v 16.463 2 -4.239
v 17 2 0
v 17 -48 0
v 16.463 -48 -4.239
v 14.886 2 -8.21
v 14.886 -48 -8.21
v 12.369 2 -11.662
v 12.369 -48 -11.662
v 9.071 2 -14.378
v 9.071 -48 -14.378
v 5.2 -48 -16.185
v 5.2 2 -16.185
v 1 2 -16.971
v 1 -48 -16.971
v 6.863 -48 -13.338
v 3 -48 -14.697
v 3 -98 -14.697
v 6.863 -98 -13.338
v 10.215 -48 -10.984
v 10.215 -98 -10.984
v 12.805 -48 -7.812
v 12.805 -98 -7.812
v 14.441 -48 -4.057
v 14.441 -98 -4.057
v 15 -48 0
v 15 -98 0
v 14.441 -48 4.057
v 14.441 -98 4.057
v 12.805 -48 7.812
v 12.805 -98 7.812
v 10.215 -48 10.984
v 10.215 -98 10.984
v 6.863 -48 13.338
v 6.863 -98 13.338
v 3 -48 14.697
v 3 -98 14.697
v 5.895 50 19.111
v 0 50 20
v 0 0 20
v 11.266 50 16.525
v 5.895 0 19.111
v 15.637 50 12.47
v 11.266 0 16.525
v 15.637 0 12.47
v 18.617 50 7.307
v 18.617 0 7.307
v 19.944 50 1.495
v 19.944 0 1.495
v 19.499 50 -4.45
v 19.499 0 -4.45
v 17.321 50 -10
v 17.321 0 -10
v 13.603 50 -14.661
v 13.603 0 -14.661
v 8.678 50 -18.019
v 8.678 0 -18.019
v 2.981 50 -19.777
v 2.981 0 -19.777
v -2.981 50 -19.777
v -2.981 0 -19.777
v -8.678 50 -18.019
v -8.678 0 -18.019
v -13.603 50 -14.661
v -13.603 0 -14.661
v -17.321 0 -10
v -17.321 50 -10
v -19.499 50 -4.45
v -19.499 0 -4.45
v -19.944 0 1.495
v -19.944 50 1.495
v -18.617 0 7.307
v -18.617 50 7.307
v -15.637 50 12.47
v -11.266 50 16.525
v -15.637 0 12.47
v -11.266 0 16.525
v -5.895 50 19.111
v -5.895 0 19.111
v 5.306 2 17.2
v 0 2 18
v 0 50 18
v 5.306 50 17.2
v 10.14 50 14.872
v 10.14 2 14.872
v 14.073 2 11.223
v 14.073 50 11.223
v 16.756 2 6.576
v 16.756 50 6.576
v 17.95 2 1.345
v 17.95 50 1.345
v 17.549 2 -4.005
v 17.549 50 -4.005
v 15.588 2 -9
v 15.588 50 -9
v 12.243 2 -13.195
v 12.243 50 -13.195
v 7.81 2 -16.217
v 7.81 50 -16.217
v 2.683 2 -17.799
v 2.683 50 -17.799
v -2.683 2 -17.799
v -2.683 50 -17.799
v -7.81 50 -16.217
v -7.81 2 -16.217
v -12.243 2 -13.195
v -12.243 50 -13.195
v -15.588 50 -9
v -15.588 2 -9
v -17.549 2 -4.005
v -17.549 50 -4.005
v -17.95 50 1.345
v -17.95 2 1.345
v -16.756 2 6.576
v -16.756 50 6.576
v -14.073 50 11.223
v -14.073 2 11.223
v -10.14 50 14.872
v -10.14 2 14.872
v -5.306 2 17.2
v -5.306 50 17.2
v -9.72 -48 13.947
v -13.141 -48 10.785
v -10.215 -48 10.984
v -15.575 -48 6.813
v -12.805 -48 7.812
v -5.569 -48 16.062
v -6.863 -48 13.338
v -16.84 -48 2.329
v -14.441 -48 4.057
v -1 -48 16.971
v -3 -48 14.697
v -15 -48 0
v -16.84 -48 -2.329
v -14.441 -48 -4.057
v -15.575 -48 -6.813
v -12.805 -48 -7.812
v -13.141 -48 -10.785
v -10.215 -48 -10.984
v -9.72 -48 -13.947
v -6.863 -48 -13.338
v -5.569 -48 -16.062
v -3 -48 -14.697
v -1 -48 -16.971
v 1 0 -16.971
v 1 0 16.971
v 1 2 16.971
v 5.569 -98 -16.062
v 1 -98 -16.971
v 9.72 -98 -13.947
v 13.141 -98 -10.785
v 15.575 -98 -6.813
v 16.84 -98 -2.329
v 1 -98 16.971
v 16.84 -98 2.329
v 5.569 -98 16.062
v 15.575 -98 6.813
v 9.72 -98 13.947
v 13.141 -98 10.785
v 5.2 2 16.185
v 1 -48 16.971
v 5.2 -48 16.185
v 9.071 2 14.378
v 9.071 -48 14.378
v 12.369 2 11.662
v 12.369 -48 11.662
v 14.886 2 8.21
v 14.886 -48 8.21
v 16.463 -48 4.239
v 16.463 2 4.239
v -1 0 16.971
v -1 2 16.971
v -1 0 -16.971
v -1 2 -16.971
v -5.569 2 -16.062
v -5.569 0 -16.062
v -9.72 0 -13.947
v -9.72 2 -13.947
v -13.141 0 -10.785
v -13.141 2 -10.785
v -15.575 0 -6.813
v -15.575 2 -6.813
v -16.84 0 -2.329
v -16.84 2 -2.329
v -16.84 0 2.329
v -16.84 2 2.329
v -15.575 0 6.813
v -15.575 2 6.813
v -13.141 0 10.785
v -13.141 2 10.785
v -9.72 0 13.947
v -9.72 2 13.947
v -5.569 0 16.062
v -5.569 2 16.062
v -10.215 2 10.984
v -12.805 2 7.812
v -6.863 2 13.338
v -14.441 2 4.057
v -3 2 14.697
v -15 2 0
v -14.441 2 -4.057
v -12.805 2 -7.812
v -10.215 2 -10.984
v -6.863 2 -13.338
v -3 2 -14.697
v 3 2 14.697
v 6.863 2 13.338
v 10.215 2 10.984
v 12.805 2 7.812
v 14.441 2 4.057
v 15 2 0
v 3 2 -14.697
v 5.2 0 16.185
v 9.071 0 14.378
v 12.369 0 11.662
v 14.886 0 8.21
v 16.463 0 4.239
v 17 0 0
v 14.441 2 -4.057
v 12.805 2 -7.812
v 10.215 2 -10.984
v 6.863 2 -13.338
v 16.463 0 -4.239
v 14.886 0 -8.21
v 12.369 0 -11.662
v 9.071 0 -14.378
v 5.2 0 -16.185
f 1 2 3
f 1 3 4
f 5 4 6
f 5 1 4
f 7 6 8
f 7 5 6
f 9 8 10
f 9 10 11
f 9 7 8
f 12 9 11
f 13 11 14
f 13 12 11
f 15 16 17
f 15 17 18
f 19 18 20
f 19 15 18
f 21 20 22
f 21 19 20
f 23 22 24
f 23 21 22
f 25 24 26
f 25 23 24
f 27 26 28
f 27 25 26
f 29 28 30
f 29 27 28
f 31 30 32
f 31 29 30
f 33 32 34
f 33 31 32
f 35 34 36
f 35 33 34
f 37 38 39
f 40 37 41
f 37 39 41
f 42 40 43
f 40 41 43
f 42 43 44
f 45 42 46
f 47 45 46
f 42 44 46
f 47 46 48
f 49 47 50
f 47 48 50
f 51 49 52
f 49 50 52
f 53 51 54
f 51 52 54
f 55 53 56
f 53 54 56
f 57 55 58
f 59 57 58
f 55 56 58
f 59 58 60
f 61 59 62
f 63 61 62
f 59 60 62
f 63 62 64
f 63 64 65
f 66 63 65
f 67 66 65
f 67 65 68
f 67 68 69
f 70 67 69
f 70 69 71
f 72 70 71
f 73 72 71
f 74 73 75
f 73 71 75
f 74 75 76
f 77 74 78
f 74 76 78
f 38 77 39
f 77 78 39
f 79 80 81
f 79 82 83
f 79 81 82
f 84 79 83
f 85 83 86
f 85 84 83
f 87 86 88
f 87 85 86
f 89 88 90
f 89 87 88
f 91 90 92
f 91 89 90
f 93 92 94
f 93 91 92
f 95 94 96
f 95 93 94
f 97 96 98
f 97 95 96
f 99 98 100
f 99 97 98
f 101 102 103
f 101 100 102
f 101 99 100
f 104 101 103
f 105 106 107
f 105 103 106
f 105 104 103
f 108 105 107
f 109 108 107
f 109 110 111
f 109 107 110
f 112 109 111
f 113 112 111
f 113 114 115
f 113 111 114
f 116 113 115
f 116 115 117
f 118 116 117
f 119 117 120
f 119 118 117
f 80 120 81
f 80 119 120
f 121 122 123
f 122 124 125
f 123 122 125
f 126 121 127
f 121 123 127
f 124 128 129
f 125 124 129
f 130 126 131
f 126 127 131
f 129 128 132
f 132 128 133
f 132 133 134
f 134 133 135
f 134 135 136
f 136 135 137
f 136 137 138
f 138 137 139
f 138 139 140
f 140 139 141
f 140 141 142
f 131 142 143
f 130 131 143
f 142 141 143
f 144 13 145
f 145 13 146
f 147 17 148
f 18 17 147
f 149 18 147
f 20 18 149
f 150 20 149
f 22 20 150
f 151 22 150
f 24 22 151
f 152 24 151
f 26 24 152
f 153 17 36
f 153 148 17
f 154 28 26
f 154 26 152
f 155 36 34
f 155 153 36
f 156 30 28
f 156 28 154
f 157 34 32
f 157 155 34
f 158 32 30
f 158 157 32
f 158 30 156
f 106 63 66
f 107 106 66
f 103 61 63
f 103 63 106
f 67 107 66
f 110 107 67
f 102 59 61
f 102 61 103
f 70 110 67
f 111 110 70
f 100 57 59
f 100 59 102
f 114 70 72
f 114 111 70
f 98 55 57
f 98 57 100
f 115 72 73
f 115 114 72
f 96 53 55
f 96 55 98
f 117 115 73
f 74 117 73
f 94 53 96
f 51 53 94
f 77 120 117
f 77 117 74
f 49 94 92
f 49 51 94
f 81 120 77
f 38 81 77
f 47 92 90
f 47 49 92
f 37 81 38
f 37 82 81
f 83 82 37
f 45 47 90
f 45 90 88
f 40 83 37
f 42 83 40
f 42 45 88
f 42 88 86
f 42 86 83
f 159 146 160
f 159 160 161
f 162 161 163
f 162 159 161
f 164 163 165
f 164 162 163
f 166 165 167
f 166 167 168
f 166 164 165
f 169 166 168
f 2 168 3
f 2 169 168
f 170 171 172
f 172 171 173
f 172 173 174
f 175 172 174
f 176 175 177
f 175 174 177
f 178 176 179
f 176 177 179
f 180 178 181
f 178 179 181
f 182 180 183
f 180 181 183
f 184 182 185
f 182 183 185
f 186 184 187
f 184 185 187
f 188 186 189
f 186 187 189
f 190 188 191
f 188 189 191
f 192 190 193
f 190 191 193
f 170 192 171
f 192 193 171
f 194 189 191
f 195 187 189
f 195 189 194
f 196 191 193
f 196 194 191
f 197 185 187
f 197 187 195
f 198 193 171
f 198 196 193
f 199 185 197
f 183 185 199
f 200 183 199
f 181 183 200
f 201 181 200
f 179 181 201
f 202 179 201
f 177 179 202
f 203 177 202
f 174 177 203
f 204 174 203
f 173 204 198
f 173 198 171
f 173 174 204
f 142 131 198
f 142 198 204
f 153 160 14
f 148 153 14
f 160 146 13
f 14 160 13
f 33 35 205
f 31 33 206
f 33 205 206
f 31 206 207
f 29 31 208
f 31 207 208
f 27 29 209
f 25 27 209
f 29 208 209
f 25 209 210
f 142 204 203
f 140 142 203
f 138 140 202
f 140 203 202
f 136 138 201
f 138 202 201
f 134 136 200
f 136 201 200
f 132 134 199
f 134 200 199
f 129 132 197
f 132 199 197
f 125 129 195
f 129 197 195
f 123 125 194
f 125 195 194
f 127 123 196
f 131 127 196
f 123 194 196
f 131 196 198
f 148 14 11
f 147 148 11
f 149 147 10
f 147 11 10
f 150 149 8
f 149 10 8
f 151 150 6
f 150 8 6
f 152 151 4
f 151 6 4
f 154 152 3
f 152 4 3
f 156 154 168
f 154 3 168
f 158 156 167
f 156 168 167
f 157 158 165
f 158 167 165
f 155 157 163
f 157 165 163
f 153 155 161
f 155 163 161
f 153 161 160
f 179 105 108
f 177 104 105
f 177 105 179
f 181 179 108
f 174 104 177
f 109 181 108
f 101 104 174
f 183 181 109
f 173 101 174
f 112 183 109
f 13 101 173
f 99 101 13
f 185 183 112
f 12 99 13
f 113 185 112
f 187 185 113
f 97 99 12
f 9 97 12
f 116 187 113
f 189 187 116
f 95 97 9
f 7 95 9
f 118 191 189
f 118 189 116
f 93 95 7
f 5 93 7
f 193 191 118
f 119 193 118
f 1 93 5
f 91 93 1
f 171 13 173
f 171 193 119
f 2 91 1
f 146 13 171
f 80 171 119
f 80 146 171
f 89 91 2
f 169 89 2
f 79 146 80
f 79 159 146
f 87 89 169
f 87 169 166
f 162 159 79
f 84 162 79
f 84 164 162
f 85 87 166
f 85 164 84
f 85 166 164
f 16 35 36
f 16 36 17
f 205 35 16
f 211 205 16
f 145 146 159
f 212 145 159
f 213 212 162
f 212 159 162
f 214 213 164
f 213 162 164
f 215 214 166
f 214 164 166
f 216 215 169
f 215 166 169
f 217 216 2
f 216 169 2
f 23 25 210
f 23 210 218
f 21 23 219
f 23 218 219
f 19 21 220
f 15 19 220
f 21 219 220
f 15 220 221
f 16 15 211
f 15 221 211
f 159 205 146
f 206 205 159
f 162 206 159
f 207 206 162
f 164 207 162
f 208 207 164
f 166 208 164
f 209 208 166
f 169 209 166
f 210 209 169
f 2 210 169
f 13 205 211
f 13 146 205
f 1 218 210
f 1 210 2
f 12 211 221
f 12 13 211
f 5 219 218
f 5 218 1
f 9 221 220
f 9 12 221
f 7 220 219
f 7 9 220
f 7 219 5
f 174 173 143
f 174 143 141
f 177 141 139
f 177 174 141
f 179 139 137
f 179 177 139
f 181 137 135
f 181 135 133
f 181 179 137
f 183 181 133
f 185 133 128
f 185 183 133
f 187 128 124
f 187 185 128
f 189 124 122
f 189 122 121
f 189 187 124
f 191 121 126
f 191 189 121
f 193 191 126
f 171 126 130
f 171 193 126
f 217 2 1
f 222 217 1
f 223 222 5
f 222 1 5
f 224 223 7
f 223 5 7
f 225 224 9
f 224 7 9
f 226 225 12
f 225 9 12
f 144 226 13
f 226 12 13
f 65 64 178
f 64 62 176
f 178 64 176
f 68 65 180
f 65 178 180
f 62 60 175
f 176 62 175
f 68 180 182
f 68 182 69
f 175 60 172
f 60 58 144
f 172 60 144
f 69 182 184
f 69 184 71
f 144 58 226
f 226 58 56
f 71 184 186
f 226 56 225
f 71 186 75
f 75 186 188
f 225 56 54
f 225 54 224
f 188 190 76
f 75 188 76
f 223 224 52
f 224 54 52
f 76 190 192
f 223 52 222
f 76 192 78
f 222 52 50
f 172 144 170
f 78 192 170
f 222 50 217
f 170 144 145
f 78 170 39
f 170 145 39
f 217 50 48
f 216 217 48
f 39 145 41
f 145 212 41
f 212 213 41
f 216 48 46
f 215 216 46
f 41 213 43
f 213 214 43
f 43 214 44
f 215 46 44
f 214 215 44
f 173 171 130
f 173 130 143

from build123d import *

# Parameters (mm, degrees)
SKETCH1_R              = 20
BOSS_EXTRUDE1_DEPTH    = 50
SHELL3_T               = -2
CUT_EXTRUDE1_DEPTH     = 50
BOSS_EXTRUDE3_DEPTH    = 50
BOSS_EXTRUDE3_2_DEPTH  = 50
SHELL6_T               = -2
SHELL7_T               = -2
PROCESSINGADJUST_DEPTH = 50


with BuildPart() as part:
    # Sketch1 → Boss-Extrude1 (new body)
    with BuildSketch(Plane(origin=(0, 0, 0), x_dir=(1, 0, 0), z_dir=(0, 1, 0))):
        with Locations(Location((0, 0, 0), (0, 0, 270))):
            Circle(SKETCH1_R)
    extrude(amount=BOSS_EXTRUDE1_DEPTH)

    # Shell3
    shell3_openings = [part.faces().sort_by_distance(p)[0] for p in [
        (0, 50, 0),
    ]]
    offset(amount=SHELL3_T, openings=shell3_openings, kind=Kind.INTERSECTION)

    # Sketch2 → Cut-Extrude1 (cut)
    with BuildSketch(Plane(origin=(0, 2, 0), x_dir=(1, 0, 0), z_dir=(0, 1, 0))):
        with BuildLine():
            ThreePointArc((17, 0), (12.369316877, 11.66190379), (1, 16.970562748))
            Line((1, 16.970562748), (1, -16.970562748))
            ThreePointArc((1, -16.970562748), (12.369316877, -11.66190379), (17, 0))
        make_face()
        with BuildLine():
            Line((-1, -16.970562748), (-1, 16.970562748))
            ThreePointArc((-1, 16.970562748), (-17, 0), (-1, -16.970562748))
        make_face()
    extrude(amount=-CUT_EXTRUDE1_DEPTH, mode=Mode.SUBTRACT)


with BuildPart() as body_2:
    # Sketch2 → Boss-Extrude3 (new body)
    with BuildSketch(Plane(origin=(0, 2, 0), x_dir=(1, 0, 0), z_dir=(0, 1, 0))):
        with BuildLine():
            ThreePointArc((17, 0), (12.369316877, 11.66190379), (1, 16.970562748))
            Line((1, 16.970562748), (1, -16.970562748))
            ThreePointArc((1, -16.970562748), (12.369316877, -11.66190379), (17, 0))
        make_face()
    extrude(amount=-BOSS_EXTRUDE3_DEPTH)

    # Shell6
    shell6_openings = [body_2.faces().sort_by_distance(p)[0] for p in [
        (7.758345486, -48, 0),
        (7.758345486, 2, 0),
    ]]
    offset(amount=SHELL6_T, openings=shell6_openings)

    # Sketch7 → processingadjust (add)
    with BuildSketch(Plane.XZ.offset(48)):
        with BuildLine():
            Line((1, 16.970562748), (1, -16.970562748))
            ThreePointArc((1, -16.970562748), (17, 0), (1, 16.970562748))
        make_face()
        with BuildLine():
            Line((3, 14.696938457), (3, -14.696938457))
            ThreePointArc((3, -14.696938457), (15, 0), (3, 14.696938457))
        make_face(mode=Mode.SUBTRACT)
    extrude(amount=PROCESSINGADJUST_DEPTH)


with BuildPart() as body_3:
    # Sketch2 → Boss-Extrude3 2 (new body)
    with BuildSketch(Plane(origin=(0, 2, 0), x_dir=(1, 0, 0), z_dir=(0, 1, 0))):
        with BuildLine():
            Line((-1, -16.970562748), (-1, 16.970562748))
            ThreePointArc((-1, 16.970562748), (-17, 0), (-1, -16.970562748))
        make_face()
    extrude(amount=-BOSS_EXTRUDE3_2_DEPTH)

    # Shell7
    shell7_openings = [body_3.faces().sort_by_distance(p)[0] for p in [
        (-7.758345486, -48, 0),
        (-7.758345486, 2, 0),
    ]]
    offset(amount=SHELL7_T, openings=shell7_openings)


solid = Compound([part.part, body_2.part, body_3.part])
